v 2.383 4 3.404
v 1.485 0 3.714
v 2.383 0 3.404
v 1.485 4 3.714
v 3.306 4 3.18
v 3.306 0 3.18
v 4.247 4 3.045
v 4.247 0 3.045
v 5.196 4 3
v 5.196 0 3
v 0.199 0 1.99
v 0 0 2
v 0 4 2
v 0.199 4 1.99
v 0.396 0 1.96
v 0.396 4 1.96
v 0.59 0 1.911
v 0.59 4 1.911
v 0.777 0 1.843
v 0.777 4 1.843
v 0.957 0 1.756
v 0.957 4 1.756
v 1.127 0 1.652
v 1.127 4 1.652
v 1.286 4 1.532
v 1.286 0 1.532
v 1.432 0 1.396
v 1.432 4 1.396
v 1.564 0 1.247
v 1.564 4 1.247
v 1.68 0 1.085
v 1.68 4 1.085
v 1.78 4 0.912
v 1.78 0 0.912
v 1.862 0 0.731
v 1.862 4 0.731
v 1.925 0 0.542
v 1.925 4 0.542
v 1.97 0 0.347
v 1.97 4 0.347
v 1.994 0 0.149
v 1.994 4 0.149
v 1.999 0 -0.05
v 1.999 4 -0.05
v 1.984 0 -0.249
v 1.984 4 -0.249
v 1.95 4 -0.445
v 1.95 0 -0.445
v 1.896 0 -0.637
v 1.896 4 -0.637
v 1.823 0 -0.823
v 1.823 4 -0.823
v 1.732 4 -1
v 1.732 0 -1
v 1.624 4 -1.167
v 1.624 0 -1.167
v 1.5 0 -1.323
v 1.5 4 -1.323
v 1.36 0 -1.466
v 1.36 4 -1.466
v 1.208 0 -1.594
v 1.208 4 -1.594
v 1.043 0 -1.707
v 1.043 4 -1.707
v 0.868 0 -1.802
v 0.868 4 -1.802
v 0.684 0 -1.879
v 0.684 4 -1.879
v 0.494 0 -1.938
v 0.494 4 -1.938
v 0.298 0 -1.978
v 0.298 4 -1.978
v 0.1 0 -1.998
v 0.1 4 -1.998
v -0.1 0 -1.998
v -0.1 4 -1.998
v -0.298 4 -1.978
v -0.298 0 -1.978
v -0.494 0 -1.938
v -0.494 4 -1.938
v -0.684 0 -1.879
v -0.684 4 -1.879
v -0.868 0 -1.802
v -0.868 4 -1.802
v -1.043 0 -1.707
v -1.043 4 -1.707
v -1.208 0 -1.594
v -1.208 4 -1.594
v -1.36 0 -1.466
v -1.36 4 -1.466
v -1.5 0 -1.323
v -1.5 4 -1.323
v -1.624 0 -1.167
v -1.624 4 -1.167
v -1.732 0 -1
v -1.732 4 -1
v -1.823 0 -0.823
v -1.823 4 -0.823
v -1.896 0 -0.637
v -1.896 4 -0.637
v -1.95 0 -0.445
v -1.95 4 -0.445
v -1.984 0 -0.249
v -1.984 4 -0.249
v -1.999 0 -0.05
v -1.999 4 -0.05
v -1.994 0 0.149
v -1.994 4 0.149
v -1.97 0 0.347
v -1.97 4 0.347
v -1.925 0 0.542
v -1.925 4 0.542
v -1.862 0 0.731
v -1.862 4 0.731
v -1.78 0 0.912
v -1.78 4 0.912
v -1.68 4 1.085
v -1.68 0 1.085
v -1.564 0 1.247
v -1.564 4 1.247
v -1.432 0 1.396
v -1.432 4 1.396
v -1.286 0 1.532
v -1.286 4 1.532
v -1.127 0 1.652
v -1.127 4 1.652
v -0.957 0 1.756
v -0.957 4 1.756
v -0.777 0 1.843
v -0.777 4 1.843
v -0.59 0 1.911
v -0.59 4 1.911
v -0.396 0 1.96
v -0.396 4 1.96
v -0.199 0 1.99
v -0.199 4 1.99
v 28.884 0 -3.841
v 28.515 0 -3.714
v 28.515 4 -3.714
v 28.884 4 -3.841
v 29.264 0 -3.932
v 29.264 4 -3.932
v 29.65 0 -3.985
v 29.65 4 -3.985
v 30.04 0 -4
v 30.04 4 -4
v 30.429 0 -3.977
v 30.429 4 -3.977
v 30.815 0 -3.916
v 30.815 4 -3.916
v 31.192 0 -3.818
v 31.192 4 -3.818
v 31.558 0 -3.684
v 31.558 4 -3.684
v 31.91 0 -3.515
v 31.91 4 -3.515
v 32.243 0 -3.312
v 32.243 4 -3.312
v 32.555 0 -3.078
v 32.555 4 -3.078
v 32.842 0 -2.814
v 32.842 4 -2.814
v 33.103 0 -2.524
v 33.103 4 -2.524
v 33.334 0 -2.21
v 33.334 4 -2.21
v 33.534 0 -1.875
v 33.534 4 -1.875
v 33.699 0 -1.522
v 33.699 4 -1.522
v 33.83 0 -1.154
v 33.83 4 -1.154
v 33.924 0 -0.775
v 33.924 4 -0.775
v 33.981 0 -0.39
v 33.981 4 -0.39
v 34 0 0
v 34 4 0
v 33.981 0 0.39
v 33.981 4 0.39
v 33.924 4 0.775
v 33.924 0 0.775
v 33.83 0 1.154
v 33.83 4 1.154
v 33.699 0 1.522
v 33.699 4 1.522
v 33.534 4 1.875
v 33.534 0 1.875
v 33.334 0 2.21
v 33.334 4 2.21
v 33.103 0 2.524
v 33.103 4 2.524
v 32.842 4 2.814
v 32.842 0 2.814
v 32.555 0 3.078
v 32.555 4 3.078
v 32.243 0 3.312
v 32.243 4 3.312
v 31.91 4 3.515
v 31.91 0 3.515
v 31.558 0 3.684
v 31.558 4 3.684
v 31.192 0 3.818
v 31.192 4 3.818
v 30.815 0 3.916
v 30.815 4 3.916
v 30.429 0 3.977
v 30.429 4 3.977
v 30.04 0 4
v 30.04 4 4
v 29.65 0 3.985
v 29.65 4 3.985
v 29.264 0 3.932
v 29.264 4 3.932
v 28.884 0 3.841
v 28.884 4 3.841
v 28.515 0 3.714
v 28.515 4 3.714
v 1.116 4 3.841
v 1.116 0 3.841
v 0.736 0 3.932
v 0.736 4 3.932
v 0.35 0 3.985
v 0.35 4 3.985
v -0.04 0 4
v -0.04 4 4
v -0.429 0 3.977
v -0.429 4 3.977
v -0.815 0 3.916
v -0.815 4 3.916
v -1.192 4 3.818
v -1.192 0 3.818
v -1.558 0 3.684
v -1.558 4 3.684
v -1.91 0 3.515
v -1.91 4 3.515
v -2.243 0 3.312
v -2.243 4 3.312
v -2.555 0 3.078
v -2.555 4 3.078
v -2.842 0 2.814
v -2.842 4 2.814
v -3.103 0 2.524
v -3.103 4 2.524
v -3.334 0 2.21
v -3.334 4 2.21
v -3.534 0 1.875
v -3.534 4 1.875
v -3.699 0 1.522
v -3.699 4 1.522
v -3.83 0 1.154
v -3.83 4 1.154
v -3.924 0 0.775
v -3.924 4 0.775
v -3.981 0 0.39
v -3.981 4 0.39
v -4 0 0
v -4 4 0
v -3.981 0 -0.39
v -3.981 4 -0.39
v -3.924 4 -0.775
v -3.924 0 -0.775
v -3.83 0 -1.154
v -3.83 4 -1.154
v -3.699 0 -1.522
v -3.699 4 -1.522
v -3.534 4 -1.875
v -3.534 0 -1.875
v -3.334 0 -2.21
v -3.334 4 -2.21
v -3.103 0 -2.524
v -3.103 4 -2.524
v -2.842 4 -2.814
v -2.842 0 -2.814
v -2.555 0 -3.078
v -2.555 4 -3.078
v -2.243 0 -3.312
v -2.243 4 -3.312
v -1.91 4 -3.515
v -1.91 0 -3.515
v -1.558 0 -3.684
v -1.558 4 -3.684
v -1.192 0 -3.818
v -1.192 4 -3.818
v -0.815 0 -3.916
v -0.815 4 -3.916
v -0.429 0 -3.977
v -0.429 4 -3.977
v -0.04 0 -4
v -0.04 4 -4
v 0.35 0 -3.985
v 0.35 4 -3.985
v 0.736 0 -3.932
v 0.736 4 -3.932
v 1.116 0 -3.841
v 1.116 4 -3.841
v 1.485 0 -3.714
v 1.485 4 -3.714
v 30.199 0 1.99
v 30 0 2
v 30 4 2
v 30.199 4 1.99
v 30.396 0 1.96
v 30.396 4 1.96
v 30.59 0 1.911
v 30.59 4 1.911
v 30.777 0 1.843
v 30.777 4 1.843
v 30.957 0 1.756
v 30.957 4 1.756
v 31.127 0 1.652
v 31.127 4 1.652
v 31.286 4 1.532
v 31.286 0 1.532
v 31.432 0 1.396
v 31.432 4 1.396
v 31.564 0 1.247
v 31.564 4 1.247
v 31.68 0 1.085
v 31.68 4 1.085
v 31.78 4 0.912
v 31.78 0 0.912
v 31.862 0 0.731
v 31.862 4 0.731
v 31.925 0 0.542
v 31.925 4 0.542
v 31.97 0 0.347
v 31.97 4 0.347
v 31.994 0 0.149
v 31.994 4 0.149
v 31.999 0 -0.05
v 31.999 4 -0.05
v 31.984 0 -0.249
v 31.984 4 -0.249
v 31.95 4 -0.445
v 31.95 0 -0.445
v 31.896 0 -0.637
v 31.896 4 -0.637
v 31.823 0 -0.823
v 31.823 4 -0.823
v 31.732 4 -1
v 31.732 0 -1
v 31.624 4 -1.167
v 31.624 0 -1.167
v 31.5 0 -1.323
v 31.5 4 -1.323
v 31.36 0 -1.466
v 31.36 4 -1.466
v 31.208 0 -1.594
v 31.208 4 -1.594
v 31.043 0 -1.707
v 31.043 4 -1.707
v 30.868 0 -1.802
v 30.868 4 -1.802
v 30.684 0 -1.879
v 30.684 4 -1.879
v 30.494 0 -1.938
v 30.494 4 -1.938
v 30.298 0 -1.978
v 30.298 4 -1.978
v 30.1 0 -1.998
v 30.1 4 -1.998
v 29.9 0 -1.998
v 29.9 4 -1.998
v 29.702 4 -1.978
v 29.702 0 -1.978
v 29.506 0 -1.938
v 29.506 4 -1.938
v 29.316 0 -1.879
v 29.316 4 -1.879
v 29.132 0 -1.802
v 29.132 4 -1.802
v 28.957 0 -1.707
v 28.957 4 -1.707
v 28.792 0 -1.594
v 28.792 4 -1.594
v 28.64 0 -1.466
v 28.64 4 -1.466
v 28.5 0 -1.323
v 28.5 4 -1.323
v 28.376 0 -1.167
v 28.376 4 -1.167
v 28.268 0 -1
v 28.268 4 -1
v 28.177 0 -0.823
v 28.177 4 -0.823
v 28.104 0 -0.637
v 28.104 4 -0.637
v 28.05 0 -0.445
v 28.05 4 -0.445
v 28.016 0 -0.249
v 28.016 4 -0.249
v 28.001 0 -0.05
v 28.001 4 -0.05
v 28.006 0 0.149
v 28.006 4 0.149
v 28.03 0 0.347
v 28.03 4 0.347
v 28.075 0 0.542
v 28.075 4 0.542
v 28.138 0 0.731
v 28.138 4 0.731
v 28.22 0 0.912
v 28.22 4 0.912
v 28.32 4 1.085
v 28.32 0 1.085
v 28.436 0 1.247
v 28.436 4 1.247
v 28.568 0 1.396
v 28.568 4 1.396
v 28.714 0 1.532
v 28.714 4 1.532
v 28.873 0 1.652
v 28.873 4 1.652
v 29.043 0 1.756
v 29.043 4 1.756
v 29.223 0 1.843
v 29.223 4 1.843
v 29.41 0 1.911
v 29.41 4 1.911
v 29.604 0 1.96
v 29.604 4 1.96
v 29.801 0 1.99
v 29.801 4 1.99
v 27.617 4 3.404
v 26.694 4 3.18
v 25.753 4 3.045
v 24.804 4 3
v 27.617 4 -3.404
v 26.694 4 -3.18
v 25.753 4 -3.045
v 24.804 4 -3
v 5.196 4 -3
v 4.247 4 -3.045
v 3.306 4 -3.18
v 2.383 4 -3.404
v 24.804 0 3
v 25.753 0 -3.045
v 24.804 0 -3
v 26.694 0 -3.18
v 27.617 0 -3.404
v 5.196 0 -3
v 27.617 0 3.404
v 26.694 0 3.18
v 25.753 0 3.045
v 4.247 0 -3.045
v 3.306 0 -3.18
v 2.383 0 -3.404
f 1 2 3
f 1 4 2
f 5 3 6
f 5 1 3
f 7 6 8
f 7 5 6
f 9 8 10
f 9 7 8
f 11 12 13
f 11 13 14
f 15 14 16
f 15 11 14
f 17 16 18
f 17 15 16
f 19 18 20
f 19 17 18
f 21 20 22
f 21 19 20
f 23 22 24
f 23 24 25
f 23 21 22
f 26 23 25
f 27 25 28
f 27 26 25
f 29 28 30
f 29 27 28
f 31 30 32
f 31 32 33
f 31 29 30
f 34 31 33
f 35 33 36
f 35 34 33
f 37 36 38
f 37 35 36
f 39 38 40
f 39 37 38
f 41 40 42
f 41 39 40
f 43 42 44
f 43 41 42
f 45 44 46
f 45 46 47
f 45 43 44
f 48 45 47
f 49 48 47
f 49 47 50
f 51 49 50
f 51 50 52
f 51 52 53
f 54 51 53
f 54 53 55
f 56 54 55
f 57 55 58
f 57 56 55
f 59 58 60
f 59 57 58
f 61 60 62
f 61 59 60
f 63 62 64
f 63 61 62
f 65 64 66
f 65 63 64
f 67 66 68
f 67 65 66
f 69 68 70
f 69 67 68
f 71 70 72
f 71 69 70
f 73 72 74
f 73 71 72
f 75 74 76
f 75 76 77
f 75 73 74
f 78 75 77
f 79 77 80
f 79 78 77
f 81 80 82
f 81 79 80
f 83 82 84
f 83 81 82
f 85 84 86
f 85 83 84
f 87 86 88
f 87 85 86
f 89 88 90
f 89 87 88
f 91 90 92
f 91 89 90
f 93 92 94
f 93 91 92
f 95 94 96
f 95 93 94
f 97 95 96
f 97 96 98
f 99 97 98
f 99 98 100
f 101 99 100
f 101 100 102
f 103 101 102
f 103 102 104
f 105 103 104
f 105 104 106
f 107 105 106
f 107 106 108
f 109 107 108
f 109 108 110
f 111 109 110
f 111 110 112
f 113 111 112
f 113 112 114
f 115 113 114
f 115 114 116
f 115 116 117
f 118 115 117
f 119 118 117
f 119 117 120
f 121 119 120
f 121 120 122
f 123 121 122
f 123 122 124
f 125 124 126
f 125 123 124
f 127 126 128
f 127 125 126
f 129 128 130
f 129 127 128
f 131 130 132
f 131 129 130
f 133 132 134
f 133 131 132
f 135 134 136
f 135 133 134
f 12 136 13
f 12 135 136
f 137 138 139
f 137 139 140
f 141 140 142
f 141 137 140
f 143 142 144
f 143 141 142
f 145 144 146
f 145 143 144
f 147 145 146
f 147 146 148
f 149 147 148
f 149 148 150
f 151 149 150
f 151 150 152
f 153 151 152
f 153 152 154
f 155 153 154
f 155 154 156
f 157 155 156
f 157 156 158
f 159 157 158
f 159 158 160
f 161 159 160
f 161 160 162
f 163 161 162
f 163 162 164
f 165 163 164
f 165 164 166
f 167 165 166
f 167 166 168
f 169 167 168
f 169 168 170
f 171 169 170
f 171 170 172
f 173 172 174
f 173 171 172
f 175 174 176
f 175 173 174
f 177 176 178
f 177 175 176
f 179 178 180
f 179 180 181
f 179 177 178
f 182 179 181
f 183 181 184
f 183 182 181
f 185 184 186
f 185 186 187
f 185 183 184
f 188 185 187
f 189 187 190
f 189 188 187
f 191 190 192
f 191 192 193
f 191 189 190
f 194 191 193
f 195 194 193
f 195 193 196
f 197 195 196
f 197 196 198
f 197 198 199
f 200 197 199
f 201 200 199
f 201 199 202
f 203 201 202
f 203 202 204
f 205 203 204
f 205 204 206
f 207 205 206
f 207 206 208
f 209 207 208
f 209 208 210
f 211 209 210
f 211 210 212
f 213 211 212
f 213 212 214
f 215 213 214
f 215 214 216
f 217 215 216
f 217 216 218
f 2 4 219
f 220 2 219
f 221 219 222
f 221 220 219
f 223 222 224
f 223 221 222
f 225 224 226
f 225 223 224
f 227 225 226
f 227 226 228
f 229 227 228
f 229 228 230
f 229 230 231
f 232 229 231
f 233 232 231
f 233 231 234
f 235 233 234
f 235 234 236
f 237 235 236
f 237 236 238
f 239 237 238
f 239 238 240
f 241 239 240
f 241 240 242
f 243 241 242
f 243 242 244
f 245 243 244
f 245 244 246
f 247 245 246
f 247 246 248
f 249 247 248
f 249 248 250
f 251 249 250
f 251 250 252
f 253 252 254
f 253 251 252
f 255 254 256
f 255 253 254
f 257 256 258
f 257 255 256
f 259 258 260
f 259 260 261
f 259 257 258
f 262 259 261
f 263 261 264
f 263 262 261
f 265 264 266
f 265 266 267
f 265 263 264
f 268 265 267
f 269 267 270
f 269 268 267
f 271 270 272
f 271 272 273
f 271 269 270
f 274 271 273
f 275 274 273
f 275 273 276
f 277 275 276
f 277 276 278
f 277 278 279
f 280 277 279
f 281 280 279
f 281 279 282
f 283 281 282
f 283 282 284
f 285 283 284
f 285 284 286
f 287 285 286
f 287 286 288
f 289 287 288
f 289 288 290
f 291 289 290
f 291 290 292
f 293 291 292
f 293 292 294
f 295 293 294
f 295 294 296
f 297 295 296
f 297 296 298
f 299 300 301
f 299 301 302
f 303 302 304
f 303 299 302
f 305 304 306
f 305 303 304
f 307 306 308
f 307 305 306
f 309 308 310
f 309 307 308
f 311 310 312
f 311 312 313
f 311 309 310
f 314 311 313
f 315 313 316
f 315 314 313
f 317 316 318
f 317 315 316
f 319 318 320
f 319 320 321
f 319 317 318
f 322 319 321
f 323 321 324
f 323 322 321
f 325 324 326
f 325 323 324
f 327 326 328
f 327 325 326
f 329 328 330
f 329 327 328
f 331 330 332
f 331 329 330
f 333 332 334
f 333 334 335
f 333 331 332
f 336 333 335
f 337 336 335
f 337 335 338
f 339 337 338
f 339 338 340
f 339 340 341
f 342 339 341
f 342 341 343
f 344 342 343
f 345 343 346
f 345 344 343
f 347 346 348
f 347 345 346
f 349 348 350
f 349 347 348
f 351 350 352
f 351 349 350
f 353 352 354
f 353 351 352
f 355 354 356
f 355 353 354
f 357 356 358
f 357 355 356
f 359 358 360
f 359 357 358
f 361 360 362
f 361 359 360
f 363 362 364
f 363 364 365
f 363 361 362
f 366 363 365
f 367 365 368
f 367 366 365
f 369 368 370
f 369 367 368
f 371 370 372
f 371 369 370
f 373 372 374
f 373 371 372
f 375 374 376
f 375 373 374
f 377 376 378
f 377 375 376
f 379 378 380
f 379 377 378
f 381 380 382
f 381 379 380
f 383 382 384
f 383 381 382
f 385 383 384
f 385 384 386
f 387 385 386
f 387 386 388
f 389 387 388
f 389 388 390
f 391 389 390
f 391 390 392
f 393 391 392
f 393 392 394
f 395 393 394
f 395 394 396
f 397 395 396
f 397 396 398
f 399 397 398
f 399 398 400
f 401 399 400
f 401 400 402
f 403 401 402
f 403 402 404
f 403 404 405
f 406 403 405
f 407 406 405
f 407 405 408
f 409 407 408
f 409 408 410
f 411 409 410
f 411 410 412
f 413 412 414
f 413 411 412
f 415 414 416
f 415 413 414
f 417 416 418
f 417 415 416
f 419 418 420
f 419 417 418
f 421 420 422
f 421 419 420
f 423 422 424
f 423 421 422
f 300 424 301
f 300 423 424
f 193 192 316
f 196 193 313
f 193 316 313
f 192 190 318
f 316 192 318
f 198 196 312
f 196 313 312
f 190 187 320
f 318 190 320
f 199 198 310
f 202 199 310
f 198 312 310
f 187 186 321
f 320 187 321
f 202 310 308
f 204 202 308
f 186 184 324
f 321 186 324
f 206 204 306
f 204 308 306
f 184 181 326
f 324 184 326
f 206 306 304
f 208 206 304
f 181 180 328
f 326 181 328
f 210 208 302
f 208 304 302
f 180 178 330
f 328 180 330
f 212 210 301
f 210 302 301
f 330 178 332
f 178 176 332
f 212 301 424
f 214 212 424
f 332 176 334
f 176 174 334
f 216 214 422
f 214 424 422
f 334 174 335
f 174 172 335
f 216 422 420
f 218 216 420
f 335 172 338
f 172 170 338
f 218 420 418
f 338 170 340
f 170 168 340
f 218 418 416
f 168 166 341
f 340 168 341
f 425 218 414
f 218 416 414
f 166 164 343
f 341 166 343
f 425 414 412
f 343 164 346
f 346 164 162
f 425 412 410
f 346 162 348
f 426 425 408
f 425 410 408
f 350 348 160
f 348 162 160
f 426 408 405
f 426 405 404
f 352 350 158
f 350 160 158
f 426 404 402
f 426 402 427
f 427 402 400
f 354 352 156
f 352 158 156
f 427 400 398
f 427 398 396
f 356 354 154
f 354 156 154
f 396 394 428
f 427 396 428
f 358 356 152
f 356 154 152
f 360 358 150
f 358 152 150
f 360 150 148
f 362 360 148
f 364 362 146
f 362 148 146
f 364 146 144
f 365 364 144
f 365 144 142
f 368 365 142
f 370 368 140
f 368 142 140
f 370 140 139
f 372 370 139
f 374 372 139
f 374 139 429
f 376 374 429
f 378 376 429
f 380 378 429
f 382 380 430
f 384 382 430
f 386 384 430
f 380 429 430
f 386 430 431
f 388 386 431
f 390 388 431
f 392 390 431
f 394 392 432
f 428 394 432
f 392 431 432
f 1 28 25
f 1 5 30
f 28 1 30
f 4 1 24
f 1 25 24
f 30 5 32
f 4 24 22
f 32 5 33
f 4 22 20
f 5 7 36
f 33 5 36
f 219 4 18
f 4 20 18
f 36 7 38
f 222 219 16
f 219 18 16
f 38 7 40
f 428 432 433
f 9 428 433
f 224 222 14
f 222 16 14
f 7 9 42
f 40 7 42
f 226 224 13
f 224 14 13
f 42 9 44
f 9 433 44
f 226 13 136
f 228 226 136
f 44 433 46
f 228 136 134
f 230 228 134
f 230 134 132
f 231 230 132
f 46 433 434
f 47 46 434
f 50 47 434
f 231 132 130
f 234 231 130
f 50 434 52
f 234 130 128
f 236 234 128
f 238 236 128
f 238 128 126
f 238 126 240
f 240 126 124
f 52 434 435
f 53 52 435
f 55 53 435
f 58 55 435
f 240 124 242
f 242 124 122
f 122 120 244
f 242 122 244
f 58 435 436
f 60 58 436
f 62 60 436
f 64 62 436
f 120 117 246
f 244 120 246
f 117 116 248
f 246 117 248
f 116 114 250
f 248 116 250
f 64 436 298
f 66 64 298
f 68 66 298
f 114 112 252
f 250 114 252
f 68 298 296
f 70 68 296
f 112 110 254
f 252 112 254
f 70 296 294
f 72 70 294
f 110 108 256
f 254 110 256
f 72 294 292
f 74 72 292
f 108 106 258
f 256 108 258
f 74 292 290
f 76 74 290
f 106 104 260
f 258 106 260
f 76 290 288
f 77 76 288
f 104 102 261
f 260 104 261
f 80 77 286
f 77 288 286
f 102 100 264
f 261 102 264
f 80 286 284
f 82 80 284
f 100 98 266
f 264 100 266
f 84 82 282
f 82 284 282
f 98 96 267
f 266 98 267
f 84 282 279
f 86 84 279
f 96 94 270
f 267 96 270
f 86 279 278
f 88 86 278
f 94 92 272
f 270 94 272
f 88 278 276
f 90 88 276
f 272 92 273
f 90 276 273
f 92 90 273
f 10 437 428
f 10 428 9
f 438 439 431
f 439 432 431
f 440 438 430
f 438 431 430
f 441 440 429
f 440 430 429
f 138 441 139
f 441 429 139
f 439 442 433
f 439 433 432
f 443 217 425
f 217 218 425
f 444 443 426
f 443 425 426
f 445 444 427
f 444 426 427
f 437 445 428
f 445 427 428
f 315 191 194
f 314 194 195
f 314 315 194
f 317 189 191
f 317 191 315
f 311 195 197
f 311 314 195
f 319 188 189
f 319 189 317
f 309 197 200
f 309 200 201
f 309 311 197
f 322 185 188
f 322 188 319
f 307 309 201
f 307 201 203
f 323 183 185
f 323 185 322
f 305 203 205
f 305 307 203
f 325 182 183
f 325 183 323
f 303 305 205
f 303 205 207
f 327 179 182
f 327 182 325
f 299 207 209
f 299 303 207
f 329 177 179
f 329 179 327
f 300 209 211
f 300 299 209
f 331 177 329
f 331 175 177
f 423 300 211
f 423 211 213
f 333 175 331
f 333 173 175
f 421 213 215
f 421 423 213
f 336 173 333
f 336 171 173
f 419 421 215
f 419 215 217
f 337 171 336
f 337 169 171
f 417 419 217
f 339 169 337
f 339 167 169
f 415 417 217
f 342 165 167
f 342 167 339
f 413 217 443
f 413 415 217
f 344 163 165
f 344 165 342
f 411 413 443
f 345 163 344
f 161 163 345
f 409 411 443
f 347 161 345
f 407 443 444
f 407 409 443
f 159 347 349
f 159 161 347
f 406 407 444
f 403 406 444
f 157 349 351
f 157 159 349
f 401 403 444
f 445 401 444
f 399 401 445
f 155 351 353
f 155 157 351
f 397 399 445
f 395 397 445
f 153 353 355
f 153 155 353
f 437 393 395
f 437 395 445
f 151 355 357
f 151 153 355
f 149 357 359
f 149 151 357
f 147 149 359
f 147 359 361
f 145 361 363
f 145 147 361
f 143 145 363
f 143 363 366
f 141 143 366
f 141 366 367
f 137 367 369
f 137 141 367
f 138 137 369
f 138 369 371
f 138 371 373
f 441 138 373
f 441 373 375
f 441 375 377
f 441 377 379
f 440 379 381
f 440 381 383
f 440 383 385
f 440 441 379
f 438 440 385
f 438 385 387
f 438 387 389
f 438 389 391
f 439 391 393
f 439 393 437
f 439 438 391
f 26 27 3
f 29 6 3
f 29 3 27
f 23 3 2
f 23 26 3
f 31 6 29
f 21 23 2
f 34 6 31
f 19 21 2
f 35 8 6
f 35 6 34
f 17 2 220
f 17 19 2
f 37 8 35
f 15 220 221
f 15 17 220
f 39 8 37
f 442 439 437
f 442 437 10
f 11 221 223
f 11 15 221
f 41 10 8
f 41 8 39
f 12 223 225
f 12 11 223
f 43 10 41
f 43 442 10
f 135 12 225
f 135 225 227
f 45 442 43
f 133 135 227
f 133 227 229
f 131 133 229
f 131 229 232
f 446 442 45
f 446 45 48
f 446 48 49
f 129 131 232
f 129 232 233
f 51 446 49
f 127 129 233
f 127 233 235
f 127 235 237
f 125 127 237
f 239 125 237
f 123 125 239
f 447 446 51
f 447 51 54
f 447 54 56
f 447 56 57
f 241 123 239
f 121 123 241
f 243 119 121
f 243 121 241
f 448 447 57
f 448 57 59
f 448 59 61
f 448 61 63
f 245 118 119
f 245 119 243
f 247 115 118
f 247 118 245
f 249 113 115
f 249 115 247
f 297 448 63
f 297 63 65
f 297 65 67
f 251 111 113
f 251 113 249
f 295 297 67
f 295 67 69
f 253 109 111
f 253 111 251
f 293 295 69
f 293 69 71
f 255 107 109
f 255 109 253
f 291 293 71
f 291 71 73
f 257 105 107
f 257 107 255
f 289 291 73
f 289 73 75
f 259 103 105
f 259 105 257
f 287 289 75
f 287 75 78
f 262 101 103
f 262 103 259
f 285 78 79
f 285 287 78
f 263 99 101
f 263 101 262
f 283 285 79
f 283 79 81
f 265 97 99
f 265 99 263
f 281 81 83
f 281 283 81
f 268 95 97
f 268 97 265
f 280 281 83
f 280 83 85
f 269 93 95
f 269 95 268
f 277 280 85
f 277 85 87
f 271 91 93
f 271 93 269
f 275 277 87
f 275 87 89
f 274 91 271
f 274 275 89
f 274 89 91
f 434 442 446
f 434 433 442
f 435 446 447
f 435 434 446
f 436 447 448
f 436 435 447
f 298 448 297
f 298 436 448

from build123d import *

# Parameters (mm, degrees)
ESQUISSE1_R        = 2
BOSS_EXTRU_1_DEPTH = 4
CONG_1_R           = 10


with BuildPart() as part:
    # Esquisse1 → Boss.-Extru.1 (new body)
    with BuildSketch(Plane(origin=(0, 0, 0), x_dir=(1, 0, 0), z_dir=(0, 1, 0))):
        with BuildLine():
            Line((2.645751311, 3), (27.354248689, 3))
            ThreePointArc((27.354248689, 3), (34, 0), (27.354248689, -3))
            Line((27.354248689, -3), (2.645751311, -3))
            ThreePointArc((2.645751311, -3), (-4, 0), (2.645751311, 3))
        make_face()
        with Locations(Location((0, 0, 0), (0, 0, 270))):
            Circle(ESQUISSE1_R, mode=Mode.SUBTRACT)
        with Locations(Location((30, 0, 0), (0, 0, 270))):
            Circle(ESQUISSE1_R, mode=Mode.SUBTRACT)
    extrude(amount=BOSS_EXTRU_1_DEPTH)

    # Congé1
    cong_1_edges = [part.edges().sort_by_distance(p)[0] for p in [
        (2.645751311, 2, -3),
        (27.354248689, 2, -3),
        (27.354248689, 2, 3),
        (2.645751311, 2, 3),
    ]]
    fillet(cong_1_edges, radius=CONG_1_R)


solid = part.part
